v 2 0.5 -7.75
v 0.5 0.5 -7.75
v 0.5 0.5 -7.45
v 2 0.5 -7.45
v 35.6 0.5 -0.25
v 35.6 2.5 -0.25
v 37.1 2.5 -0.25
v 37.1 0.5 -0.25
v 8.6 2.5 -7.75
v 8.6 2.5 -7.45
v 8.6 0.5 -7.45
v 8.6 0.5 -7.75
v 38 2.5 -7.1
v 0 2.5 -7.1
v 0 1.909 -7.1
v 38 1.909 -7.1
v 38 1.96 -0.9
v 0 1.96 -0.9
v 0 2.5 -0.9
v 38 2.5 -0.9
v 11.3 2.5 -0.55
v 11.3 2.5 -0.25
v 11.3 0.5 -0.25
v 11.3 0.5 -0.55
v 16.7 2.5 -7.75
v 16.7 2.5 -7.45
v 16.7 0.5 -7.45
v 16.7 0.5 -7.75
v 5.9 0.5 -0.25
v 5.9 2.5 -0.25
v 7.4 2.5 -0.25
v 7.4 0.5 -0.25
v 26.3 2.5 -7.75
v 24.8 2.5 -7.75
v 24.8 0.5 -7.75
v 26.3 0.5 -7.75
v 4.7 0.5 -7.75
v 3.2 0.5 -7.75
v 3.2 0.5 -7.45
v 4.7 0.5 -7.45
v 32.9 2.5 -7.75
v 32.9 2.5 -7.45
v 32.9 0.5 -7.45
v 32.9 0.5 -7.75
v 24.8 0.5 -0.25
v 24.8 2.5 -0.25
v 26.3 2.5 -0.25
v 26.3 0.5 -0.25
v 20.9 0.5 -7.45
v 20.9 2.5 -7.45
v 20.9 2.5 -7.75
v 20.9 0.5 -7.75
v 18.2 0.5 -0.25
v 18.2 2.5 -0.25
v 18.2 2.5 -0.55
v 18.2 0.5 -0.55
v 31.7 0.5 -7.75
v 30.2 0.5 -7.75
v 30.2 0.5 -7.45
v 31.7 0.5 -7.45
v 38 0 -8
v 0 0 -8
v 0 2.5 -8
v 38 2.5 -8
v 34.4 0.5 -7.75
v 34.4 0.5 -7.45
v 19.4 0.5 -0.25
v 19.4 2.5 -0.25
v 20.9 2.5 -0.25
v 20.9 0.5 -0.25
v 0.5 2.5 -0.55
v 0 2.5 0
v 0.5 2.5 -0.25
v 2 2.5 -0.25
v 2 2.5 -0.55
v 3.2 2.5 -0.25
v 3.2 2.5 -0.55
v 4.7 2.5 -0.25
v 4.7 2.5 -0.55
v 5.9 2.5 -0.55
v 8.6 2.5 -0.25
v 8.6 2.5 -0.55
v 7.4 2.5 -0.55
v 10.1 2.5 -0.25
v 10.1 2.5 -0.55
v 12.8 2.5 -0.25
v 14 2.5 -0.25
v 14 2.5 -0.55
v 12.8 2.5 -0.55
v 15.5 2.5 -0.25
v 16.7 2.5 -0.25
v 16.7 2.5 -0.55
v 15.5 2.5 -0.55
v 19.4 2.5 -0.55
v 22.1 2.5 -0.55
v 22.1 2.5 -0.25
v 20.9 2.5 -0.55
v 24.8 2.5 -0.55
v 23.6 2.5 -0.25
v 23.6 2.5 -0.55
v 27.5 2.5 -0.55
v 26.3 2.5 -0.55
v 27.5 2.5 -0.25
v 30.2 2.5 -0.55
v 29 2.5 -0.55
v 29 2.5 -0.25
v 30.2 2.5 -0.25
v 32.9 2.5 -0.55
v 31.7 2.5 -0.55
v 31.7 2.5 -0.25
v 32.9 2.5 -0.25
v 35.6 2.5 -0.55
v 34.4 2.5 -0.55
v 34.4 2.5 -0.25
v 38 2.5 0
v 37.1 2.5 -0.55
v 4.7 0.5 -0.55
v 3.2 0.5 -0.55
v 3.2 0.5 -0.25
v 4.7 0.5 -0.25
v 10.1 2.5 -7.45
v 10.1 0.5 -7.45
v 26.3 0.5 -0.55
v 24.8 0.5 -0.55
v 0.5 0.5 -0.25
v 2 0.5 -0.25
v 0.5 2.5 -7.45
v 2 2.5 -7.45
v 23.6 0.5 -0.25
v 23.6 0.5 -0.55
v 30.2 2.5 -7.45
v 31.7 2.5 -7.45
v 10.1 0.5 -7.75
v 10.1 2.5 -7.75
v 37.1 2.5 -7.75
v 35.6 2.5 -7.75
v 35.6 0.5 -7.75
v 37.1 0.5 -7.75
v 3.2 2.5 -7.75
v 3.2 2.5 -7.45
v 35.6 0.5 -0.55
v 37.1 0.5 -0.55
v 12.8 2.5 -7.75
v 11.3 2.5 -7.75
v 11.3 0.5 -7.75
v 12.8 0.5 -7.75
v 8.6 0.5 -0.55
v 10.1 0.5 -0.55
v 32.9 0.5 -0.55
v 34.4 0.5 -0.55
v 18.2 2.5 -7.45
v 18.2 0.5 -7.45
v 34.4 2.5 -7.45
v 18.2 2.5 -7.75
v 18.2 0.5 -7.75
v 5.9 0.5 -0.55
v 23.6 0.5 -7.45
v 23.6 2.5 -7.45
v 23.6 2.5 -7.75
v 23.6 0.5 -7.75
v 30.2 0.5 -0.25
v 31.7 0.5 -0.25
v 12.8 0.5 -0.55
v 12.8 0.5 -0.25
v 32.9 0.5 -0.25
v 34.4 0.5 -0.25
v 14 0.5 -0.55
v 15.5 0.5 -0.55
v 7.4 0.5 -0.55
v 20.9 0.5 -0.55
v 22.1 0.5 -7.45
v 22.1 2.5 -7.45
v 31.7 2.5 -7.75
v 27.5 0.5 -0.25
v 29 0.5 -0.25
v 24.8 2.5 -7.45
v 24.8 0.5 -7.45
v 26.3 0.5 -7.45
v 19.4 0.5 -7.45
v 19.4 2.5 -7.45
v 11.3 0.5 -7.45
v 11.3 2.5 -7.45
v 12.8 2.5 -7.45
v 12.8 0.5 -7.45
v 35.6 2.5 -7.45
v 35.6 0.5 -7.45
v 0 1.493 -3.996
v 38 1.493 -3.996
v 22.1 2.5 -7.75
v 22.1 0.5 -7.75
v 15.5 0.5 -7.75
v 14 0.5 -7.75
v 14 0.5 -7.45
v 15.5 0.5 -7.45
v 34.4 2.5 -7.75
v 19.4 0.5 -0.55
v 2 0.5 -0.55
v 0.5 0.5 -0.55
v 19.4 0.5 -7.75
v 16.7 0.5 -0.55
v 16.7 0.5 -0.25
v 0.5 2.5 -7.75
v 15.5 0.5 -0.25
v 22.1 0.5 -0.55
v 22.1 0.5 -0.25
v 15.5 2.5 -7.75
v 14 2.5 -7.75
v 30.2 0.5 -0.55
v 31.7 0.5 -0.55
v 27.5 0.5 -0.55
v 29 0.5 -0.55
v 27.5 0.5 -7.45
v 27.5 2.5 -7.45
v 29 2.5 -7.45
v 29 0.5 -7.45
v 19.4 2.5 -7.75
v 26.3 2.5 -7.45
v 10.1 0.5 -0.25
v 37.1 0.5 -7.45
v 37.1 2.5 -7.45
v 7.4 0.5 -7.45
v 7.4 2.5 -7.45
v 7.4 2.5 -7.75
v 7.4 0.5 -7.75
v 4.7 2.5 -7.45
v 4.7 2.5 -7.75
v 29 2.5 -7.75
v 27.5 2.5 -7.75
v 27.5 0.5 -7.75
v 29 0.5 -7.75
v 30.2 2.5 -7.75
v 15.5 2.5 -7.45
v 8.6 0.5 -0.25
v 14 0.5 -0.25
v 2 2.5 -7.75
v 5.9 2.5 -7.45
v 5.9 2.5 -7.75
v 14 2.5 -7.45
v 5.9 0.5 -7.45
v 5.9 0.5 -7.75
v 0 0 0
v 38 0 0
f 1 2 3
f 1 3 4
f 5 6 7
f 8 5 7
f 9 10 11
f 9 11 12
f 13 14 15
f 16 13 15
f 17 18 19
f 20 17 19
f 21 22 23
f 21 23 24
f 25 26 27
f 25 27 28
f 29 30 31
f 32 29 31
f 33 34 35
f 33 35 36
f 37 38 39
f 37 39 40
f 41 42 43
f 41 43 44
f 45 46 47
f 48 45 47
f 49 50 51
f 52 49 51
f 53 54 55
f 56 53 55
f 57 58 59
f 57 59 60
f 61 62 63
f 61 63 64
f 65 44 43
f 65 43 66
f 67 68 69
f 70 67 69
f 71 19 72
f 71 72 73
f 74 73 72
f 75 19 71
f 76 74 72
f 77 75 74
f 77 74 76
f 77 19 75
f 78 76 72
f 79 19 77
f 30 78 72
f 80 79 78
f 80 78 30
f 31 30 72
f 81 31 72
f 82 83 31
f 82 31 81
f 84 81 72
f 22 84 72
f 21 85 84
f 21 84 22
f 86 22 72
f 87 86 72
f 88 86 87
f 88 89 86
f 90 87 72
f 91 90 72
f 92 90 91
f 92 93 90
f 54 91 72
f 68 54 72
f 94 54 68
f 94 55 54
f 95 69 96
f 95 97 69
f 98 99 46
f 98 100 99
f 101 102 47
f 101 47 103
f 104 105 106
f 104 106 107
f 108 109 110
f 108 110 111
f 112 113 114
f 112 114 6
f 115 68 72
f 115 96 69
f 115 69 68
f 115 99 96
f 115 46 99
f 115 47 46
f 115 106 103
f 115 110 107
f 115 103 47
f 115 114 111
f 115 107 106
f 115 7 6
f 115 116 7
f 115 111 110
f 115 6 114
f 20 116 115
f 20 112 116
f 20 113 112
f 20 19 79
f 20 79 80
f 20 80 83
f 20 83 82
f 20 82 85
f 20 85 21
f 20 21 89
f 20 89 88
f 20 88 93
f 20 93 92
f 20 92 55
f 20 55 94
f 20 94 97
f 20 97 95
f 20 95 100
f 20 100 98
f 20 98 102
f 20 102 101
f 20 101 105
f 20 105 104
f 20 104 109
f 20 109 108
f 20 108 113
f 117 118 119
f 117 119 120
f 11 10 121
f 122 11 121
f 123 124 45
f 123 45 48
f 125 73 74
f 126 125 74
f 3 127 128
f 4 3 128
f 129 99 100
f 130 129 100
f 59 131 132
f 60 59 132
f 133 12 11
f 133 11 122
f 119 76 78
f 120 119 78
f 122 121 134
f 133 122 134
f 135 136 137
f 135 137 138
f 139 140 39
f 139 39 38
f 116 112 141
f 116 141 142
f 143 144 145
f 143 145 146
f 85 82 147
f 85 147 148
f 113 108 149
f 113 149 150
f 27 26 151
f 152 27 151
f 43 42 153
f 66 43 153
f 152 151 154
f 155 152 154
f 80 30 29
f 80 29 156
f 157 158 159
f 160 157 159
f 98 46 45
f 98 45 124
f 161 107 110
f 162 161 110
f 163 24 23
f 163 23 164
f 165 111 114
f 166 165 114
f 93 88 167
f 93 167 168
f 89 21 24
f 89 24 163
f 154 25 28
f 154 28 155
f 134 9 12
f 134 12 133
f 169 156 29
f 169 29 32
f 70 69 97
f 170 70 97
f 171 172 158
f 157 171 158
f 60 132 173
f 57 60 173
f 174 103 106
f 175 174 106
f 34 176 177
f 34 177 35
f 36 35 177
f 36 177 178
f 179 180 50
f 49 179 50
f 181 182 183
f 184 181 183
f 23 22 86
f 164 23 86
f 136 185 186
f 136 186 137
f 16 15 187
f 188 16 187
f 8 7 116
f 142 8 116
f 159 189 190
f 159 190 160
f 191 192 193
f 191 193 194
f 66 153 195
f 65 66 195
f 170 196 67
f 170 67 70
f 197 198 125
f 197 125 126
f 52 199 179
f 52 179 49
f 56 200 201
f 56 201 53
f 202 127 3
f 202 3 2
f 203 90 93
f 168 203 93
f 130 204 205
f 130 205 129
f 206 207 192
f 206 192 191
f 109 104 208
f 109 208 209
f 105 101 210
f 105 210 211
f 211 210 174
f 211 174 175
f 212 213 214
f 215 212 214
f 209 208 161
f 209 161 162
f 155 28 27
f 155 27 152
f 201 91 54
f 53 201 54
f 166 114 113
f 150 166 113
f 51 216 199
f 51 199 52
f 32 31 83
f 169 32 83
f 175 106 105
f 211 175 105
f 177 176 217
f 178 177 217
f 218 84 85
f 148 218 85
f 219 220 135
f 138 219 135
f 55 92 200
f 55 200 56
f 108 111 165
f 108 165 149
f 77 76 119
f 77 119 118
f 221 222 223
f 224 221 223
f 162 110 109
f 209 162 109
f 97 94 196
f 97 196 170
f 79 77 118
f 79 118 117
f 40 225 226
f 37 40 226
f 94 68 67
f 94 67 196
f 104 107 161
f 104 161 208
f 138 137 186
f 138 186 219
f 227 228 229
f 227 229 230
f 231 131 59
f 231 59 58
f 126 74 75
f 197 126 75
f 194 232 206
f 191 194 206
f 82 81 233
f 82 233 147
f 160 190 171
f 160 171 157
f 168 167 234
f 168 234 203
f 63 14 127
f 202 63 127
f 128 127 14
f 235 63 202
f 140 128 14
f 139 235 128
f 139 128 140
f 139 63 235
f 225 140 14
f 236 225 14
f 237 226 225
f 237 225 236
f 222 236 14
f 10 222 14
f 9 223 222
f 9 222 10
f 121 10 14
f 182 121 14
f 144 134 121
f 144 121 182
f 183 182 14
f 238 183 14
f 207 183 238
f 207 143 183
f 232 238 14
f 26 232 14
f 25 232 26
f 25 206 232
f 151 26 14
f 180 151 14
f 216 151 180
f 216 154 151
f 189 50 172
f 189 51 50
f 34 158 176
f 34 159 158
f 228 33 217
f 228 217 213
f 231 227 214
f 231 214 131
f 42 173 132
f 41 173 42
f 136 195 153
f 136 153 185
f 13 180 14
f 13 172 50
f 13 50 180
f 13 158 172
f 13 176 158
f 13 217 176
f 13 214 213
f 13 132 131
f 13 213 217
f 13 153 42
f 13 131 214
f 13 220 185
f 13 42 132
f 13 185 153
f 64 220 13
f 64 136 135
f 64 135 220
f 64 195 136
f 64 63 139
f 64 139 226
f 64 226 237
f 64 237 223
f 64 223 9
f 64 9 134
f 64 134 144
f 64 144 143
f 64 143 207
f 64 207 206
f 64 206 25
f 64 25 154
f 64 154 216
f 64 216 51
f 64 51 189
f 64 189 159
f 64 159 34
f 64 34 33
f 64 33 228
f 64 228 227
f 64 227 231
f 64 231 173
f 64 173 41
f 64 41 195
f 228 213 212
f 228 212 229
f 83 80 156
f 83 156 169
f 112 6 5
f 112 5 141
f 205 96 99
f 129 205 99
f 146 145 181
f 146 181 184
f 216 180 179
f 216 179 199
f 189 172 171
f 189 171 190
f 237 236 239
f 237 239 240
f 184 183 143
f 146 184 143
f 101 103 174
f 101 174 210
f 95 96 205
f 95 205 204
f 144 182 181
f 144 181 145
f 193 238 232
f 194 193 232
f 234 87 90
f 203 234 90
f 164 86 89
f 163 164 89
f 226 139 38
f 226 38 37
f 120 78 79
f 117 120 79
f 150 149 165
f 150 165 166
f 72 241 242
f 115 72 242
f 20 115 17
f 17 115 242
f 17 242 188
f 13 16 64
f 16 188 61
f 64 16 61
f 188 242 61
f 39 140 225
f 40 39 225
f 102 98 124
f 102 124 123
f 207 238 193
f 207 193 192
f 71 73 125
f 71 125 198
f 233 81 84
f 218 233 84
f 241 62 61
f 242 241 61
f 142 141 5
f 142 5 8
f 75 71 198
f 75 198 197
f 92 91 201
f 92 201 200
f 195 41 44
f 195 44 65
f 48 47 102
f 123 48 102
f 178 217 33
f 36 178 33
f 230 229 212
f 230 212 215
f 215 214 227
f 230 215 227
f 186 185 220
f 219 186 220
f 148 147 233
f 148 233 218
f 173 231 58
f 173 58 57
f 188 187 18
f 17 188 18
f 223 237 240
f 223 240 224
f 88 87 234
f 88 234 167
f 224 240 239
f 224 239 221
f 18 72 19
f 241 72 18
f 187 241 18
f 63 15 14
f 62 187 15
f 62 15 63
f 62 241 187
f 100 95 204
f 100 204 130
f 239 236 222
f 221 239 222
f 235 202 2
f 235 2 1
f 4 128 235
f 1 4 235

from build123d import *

# Parameters (mm, degrees)
SKETCH1_W               = 38
SKETCH1_H               = 8
BOSS_EXTRUDE1_DEPTH     = 2.5
SKETCH2_W               = 1.5
SKETCH2_H               = 0.3
CUT_EXTRUDE1_DEPTH      = 2
LPATTERN1_COUNT         = 14
LPATTERN1_PITCH         = 2.7
LPATTERN1_COUNT_DIR2    = 2
LPATTERN1_PITCH_DIR2    = 7.2
CUT_EXTRUDE3_DEPTH      = 1
CUT_EXTRUDE3_DEPTH_BACK = 39


with BuildPart() as part:
    # Sketch1 → Boss-Extrude1 (new body)
    with BuildSketch(Plane(origin=(0, 0, 0), x_dir=(1, 0, 0), z_dir=(0, 1, 0))):
        with Locations((19, 4)):
            Rectangle(SKETCH1_W, SKETCH1_H)
    extrude(amount=BOSS_EXTRUDE1_DEPTH)

    # Sketch2 → Cut-Extrude1 (cut)
    with BuildSketch(Plane(origin=(0, 2.5, 0), x_dir=(1, 0, 0), z_dir=(0, 1, 0))):
        with Locations((1.25, 0.4)):
            Rectangle(SKETCH2_W, SKETCH2_H)
    cut_extrude1 = extrude(amount=-CUT_EXTRUDE1_DEPTH, mode=Mode.SUBTRACT)

    # LPattern1: Cut-Extrude1 14 × 2
    with Locations(*[(i * LPATTERN1_PITCH, 0, -j * LPATTERN1_PITCH_DIR2) for i in range(LPATTERN1_COUNT) for j in range(LPATTERN1_COUNT_DIR2) if (i, j) != (0, 0)]):
        add(cut_extrude1, mode=Mode.SUBTRACT)

    # Sketch3 → Cut-Extrude3 (cut, two sides)
    with BuildSketch(Plane.ZY) as cut_extrude3_sk:
        Polygon((-7.1, 27.554567413), (-7.1, 2.5), (-7.1, 1.909233449), (-3.996408042, 1.492540175), (-0.9, 1.959630707), (-0.9, 2.5), (-0.9, 27.554567413), (-0.9, 77.66370224), (-7.1, 77.66370224), align=None)
    extrude(amount=CUT_EXTRUDE3_DEPTH, mode=Mode.SUBTRACT)
    extrude(cut_extrude3_sk.sketch, amount=-CUT_EXTRUDE3_DEPTH_BACK, mode=Mode.SUBTRACT)


solid = part.part
